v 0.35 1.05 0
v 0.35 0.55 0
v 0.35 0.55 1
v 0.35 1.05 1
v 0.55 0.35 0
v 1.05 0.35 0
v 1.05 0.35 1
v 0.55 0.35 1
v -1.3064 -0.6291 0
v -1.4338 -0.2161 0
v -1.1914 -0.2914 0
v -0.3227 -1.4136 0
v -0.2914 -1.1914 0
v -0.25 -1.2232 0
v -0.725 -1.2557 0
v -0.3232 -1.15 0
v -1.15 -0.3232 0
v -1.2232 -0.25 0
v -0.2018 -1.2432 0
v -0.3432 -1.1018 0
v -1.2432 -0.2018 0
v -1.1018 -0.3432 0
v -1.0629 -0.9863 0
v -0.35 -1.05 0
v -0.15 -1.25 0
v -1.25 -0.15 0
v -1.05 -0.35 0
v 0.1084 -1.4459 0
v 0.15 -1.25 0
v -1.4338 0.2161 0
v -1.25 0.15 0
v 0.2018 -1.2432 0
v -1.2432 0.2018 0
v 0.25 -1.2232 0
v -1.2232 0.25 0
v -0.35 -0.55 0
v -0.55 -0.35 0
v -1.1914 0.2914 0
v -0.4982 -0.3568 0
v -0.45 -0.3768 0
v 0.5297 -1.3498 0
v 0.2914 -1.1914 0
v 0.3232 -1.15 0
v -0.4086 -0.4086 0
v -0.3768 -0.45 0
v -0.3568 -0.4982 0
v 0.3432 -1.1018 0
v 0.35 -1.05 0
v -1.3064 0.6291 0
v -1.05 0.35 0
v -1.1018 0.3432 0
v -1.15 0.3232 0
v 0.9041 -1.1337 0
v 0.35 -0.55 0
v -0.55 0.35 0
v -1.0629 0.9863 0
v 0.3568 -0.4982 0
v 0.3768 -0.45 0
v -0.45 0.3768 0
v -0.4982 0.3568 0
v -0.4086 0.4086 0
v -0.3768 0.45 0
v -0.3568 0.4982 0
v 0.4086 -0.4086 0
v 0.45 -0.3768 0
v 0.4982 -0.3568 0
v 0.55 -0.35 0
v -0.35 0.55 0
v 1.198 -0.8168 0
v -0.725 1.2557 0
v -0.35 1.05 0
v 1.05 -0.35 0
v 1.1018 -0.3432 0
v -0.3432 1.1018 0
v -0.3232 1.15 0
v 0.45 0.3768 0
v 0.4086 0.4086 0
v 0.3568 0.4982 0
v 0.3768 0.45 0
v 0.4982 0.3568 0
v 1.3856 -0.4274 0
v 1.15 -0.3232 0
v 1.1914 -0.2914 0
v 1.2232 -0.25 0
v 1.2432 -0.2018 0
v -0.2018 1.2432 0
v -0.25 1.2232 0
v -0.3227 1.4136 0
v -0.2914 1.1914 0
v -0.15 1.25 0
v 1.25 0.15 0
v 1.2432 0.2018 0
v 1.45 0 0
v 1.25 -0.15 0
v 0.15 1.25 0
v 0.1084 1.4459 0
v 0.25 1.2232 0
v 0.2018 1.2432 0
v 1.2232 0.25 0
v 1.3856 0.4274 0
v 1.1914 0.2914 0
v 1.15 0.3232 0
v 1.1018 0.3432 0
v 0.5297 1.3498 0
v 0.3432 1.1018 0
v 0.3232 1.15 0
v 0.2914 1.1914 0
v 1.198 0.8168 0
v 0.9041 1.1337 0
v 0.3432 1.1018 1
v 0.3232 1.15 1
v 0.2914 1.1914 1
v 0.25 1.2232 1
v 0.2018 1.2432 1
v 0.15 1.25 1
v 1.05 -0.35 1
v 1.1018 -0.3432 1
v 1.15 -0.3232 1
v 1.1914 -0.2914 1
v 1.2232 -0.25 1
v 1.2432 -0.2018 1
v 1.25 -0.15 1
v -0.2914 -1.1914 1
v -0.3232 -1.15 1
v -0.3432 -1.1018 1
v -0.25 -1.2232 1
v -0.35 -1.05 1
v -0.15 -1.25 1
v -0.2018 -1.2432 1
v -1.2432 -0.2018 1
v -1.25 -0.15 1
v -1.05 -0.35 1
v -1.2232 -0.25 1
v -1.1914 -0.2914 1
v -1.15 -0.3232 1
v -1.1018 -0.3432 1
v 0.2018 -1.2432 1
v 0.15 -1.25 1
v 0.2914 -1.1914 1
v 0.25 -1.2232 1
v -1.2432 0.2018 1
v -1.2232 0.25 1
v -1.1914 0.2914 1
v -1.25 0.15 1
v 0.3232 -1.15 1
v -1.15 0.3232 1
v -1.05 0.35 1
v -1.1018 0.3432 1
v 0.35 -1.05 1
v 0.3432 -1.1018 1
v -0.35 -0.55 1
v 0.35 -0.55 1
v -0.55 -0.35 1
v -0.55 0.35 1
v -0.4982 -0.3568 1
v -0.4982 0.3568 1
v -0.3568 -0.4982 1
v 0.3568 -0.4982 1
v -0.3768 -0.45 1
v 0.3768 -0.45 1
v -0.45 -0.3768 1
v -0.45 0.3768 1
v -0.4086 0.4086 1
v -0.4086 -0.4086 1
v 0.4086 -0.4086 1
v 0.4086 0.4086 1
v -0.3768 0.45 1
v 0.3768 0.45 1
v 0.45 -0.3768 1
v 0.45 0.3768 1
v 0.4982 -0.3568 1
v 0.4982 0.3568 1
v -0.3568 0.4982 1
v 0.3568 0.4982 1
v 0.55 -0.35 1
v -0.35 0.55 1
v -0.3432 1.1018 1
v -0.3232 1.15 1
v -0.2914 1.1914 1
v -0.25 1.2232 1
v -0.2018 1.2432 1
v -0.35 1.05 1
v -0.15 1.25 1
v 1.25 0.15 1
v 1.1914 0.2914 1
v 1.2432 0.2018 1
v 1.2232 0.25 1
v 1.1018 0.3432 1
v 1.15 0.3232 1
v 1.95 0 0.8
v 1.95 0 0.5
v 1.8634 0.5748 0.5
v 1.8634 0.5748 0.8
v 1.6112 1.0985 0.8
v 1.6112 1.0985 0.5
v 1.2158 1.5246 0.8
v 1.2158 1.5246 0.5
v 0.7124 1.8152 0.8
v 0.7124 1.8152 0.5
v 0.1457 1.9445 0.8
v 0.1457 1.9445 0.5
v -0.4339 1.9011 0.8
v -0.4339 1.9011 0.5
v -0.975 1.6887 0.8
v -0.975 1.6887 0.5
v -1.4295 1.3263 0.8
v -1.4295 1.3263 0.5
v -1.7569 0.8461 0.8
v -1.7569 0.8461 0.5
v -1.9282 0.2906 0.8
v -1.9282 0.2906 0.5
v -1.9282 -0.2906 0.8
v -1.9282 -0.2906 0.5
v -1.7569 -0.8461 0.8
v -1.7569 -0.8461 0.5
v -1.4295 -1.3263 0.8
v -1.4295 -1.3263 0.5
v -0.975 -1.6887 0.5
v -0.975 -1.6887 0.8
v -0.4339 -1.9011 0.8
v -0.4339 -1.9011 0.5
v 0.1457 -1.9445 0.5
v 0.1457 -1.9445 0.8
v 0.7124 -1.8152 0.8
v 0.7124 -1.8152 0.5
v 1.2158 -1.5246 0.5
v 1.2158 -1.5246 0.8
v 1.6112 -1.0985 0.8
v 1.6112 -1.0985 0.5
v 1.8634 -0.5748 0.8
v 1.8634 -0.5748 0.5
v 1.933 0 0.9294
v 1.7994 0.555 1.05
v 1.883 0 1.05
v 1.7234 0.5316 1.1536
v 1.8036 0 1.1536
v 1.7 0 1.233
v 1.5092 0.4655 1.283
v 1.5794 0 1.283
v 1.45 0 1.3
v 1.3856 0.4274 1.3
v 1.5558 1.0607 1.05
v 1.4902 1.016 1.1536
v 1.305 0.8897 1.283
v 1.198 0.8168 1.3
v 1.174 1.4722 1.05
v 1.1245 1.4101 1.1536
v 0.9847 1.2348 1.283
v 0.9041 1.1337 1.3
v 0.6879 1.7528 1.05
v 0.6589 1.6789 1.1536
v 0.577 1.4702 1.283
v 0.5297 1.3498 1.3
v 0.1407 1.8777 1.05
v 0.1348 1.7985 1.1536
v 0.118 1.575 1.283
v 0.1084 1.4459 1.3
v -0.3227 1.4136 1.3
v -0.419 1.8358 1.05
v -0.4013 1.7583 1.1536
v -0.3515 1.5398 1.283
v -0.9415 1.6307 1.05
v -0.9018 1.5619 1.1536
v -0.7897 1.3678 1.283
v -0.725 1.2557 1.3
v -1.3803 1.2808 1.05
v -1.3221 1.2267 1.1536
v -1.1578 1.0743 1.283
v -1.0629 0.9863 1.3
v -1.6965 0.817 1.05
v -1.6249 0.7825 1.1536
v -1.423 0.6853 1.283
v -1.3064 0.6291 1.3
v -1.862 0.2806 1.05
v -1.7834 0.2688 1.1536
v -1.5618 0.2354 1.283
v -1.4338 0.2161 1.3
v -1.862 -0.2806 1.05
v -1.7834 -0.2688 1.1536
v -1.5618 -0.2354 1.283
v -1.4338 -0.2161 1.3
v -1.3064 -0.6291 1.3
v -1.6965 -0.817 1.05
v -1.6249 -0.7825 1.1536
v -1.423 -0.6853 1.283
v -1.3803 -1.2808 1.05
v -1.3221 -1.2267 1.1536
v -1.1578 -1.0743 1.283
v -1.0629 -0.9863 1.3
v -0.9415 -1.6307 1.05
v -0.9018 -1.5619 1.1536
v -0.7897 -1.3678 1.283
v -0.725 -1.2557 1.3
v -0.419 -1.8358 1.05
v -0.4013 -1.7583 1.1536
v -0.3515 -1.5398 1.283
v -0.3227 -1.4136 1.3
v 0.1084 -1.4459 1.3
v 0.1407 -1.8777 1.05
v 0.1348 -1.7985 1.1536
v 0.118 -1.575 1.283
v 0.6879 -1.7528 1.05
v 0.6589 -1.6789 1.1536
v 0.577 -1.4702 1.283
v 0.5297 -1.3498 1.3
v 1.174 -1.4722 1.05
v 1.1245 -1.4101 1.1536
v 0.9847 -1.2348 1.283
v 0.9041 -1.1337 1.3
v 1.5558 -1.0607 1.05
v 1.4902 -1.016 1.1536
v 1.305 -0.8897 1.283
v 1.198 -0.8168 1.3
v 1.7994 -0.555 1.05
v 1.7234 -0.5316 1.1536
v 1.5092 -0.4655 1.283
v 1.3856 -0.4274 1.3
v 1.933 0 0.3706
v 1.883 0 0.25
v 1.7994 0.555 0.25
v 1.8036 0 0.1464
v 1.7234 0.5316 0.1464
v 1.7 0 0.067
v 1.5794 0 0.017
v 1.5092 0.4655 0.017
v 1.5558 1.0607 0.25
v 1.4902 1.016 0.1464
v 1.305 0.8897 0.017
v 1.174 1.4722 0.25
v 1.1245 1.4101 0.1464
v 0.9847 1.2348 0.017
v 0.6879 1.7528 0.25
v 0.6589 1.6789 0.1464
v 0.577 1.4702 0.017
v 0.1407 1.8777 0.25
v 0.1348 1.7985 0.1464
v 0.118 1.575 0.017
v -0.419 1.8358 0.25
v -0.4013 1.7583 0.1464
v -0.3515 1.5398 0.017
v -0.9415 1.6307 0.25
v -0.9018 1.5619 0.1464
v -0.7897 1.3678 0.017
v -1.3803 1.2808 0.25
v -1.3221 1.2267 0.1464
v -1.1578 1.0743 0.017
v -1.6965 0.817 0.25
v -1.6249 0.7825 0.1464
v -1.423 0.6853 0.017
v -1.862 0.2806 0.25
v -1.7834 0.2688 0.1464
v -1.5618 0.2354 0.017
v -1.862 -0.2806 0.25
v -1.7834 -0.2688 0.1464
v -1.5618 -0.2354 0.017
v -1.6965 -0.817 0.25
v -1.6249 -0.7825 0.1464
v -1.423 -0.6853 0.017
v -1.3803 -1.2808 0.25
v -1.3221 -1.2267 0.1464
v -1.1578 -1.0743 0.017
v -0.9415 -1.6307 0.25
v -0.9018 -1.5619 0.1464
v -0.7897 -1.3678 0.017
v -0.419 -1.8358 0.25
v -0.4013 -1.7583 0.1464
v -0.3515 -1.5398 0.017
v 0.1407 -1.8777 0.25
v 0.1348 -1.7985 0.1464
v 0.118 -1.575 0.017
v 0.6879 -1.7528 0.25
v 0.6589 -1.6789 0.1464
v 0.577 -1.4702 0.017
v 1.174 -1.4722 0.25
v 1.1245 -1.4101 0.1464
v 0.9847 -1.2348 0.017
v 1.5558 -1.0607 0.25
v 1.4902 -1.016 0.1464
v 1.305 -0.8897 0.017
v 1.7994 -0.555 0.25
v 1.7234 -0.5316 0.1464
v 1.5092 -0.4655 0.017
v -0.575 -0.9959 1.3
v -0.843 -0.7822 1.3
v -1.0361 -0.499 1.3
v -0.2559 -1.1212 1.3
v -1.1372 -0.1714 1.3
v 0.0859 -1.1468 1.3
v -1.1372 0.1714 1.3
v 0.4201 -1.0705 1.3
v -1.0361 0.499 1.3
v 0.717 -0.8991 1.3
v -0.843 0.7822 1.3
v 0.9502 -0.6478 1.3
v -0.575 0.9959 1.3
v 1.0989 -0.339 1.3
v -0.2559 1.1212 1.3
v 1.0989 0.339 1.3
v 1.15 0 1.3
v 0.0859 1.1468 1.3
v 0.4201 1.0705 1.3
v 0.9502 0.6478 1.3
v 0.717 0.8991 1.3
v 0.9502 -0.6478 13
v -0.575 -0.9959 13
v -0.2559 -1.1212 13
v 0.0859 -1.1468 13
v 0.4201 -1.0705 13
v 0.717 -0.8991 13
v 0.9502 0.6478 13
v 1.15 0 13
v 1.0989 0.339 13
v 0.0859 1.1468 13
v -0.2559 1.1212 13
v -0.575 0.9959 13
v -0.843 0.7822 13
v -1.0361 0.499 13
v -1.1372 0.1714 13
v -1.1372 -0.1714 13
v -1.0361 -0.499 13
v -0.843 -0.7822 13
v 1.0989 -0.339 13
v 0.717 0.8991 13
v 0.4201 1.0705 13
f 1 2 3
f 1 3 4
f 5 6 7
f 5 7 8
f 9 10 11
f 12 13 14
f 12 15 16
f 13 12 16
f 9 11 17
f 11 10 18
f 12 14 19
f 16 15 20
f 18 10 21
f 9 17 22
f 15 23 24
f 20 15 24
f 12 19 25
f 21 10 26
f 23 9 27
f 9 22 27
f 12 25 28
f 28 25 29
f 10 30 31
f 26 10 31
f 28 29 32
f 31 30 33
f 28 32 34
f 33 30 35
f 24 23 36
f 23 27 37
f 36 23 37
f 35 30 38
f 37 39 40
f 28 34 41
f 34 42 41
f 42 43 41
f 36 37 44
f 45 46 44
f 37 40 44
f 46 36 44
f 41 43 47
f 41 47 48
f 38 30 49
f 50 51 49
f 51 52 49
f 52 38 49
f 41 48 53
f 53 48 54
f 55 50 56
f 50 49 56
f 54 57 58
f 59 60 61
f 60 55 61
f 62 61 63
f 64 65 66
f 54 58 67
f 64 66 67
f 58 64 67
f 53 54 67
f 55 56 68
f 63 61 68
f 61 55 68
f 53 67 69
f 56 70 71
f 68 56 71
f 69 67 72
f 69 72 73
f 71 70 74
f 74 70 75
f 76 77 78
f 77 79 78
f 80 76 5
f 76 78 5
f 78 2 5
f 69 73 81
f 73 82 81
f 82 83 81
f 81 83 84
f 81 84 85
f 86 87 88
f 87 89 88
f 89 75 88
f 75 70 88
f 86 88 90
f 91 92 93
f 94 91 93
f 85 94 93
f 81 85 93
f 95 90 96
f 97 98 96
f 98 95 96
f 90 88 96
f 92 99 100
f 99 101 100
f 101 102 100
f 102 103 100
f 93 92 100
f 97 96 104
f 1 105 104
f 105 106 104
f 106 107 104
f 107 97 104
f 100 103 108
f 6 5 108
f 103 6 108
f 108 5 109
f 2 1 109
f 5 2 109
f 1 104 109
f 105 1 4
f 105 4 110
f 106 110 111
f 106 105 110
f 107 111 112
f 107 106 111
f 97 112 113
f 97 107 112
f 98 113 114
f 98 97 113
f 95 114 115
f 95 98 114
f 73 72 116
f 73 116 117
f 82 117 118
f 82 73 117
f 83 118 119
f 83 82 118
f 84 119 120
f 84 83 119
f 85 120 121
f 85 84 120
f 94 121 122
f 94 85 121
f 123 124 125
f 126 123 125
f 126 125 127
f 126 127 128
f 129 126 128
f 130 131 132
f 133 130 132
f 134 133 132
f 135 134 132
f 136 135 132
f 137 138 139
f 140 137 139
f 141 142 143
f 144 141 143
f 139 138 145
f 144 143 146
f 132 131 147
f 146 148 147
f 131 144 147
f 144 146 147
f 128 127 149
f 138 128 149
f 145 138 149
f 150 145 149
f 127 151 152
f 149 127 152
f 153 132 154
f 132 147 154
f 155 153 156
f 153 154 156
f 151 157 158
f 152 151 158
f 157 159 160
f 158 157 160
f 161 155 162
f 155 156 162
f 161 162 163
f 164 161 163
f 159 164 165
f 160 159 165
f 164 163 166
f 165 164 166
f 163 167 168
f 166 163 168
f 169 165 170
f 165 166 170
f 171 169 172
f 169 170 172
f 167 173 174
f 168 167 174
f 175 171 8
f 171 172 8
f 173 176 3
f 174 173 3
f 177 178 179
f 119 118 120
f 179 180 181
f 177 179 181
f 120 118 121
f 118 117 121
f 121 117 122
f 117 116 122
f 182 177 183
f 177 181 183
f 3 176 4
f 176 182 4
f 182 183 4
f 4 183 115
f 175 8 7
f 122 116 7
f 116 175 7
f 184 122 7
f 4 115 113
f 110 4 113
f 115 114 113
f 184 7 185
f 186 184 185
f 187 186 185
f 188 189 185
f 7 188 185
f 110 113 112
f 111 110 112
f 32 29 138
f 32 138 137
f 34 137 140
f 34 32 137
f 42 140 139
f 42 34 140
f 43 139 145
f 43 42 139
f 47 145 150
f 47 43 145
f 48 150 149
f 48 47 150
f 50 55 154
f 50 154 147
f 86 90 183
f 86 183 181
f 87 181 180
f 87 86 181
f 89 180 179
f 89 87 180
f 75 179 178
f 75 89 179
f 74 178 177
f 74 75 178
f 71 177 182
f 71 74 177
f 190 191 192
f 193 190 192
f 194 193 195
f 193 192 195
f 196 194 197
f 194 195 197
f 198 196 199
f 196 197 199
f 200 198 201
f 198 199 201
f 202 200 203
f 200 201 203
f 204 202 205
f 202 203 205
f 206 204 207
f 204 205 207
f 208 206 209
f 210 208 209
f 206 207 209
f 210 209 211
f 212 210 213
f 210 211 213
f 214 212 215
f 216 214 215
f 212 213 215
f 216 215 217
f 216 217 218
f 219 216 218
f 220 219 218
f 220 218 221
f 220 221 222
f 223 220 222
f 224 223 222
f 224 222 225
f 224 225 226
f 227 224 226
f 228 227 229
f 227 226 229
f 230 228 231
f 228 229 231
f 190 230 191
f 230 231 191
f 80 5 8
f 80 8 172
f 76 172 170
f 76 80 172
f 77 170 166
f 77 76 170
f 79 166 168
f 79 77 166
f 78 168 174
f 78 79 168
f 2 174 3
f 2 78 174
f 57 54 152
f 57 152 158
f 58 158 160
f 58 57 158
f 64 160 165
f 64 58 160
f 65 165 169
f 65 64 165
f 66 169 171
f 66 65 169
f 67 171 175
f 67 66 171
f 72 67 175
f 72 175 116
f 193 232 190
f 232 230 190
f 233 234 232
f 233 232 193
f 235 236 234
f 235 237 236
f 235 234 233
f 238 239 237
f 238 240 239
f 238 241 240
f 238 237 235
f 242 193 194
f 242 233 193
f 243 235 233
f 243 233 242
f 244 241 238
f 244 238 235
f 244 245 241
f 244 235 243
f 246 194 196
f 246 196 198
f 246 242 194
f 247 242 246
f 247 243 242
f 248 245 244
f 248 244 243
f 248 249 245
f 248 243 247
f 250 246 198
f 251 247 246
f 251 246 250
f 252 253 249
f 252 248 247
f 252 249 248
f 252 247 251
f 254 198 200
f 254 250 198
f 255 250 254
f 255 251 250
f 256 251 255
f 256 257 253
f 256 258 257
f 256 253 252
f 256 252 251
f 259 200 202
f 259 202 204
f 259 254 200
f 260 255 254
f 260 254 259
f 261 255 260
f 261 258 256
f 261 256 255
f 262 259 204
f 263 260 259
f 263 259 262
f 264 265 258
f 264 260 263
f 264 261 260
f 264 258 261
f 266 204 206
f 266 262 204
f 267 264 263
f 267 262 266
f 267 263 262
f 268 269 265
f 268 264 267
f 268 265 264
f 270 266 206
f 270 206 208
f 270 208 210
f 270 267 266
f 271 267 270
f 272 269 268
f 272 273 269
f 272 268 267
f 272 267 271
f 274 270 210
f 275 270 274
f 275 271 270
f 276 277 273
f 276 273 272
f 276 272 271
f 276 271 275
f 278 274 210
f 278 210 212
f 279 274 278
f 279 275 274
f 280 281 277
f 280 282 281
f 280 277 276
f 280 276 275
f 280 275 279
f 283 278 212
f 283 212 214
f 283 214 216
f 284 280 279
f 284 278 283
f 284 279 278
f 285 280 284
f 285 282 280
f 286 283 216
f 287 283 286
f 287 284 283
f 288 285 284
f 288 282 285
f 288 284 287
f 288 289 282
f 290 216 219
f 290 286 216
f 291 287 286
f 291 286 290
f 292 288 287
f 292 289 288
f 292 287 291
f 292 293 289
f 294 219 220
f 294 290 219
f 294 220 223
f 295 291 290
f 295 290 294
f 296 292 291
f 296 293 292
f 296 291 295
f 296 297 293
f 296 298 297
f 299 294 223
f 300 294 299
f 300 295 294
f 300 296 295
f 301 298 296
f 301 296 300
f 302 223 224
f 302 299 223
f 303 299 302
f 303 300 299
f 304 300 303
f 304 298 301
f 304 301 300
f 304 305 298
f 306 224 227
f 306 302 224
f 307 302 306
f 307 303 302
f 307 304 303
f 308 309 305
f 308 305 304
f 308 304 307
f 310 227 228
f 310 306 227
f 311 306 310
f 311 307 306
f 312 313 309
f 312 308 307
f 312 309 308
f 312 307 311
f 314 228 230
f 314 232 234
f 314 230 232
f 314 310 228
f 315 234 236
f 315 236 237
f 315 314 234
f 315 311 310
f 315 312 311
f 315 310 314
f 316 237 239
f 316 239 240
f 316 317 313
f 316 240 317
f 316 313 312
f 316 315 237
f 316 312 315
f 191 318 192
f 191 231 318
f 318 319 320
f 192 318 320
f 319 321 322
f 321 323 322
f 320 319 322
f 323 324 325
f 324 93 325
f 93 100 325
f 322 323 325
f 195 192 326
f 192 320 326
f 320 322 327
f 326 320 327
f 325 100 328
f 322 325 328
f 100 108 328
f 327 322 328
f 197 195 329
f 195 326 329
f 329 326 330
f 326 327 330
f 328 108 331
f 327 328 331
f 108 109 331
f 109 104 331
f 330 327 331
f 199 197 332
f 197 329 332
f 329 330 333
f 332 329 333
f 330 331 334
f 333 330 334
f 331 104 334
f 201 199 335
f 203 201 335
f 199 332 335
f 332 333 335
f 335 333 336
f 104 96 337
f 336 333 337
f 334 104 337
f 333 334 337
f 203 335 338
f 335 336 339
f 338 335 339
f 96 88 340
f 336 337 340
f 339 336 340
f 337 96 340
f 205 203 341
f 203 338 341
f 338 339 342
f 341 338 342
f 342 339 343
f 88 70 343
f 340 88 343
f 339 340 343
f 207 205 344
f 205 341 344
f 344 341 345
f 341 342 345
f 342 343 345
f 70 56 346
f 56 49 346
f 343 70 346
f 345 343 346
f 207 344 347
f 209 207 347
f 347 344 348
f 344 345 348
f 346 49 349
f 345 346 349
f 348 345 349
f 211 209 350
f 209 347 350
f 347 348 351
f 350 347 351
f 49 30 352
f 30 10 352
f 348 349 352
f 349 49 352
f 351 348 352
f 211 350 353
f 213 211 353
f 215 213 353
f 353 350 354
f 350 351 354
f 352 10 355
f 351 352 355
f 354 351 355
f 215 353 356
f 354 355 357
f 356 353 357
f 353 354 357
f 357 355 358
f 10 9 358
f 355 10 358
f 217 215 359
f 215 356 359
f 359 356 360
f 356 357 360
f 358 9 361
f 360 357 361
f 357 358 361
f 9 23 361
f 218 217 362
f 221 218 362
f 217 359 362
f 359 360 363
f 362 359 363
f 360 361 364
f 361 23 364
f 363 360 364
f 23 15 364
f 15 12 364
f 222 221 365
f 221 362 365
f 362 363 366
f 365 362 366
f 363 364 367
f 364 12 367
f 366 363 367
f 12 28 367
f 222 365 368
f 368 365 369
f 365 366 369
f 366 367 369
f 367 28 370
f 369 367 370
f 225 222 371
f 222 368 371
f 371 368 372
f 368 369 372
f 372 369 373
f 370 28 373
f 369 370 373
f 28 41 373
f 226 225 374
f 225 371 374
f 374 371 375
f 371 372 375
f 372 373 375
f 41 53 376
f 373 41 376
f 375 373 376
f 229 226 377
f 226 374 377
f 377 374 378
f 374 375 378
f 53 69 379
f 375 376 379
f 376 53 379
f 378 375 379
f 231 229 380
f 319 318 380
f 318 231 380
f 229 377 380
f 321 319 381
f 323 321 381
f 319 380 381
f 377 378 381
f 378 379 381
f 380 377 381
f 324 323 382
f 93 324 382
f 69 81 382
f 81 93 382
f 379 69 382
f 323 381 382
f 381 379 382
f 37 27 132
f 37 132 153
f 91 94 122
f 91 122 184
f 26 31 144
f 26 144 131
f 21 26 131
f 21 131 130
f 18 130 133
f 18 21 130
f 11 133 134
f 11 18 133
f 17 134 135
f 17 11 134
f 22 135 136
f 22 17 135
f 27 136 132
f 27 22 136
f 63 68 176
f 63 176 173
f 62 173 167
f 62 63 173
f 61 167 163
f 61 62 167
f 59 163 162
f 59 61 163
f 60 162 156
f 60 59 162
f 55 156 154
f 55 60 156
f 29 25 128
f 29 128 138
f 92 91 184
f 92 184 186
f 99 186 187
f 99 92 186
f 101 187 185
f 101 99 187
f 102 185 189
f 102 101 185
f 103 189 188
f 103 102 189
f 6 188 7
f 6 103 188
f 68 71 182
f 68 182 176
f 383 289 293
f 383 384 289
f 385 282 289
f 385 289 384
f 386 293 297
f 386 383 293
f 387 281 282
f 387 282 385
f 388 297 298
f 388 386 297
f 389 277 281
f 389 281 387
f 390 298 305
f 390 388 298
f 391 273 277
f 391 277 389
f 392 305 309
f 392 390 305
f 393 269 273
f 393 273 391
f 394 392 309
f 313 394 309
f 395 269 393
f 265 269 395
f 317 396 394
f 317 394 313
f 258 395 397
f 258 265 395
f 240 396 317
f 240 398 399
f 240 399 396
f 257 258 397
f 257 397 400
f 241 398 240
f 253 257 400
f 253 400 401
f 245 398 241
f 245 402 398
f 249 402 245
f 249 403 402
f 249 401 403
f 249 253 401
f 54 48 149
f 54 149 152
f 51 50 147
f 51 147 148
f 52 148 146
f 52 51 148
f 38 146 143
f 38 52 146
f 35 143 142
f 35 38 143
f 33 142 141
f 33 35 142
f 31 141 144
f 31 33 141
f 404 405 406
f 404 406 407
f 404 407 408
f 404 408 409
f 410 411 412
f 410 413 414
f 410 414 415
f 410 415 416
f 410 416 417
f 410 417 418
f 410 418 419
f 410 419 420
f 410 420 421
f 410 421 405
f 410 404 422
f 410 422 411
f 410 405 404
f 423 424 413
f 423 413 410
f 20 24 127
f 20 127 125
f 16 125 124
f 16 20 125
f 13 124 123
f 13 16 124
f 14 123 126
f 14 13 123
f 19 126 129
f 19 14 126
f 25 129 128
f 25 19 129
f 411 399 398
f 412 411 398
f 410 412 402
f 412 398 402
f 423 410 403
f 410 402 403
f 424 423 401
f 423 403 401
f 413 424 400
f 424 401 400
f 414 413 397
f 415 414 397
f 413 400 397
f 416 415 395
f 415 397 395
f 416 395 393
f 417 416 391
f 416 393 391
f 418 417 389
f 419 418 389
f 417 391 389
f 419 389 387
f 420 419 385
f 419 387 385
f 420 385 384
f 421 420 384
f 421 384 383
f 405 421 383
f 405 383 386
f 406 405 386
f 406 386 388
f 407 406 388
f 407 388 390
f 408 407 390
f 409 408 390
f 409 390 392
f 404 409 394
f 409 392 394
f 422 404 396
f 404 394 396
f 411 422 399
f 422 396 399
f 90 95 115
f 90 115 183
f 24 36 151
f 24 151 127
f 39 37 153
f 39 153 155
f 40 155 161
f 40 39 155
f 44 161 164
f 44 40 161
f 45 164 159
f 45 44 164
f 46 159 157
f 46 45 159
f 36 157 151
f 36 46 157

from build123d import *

# Parameters (mm, degrees)
SKETCH1_R           = 1.95
BOSS_EXTRUDE1_DEPTH = 1.3
CUT_EXTRUDE1_DEPTH  = 1
SKETCH3_R           = 1.15
BOSS_EXTRUDE2_DEPTH = 11.7
FILLET1_R           = 0.5


with BuildPart() as part:
    # Sketch1 → Boss-Extrude1 (new body)
    with BuildSketch(Plane.XY):
        Circle(SKETCH1_R)
    extrude(amount=BOSS_EXTRUDE1_DEPTH)

    # Sketch2 → Cut-Extrude1 (cut)
    with BuildSketch(Plane(origin=(0, 0, 0), x_dir=(-1, 0, 0), z_dir=(0, 0, -1))):
        with BuildLine():
            Line((-0.15, 1.25), (0.15, 1.25))
            ThreePointArc((0.15, 1.25), (0.291421356, 1.191421356), (0.35, 1.05))
            Line((0.35, 1.05), (0.35, 0.55))
            ThreePointArc((0.35, 0.55), (0.408578644, 0.408578644), (0.55, 0.35))
            Line((0.55, 0.35), (1.05, 0.35))
            ThreePointArc((1.05, 0.35), (1.191421356, 0.291421356), (1.25, 0.15))
            Line((1.25, 0.15), (1.25, -0.15))
            ThreePointArc((1.25, -0.15), (1.191421356, -0.291421356), (1.05, -0.35))
            Line((1.05, -0.35), (0.55, -0.35))
            ThreePointArc((0.55, -0.35), (0.408578644, -0.408578644), (0.35, -0.55))
            Line((0.35, -0.55), (0.35, -1.05))
            ThreePointArc((0.35, -1.05), (0.291421356, -1.191421356), (0.15, -1.25))
            Line((0.15, -1.25), (-0.15, -1.25))
            ThreePointArc((-0.15, -1.25), (-0.291421356, -1.191421356), (-0.35, -1.05))
            Line((-0.35, -1.05), (-0.35, -0.55))
            ThreePointArc((-0.35, -0.55), (-0.408578644, -0.408578644), (-0.55, -0.35))
            Line((-0.55, -0.35), (-1.05, -0.35))
            ThreePointArc((-1.05, -0.35), (-1.191421356, -0.291421356), (-1.25, -0.15))
            Line((-1.25, -0.15), (-1.25, 0.15))
            ThreePointArc((-1.25, 0.15), (-1.191421356, 0.291421356), (-1.05, 0.35))
            Line((-1.05, 0.35), (-0.55, 0.35))
            ThreePointArc((-0.55, 0.35), (-0.408578644, 0.408578644), (-0.35, 0.55))
            Line((-0.35, 0.55), (-0.35, 1.05))
            ThreePointArc((-0.35, 1.05), (-0.291421356, 1.191421356), (-0.15, 1.25))
        make_face()
    extrude(amount=-CUT_EXTRUDE1_DEPTH, mode=Mode.SUBTRACT)

    # Sketch3 → Boss-Extrude2 (add)
    with BuildSketch(Plane.XY.offset(1.3)):
        Circle(SKETCH3_R)
    extrude(amount=BOSS_EXTRUDE2_DEPTH)

    # Fillet1
    fillet1_edges = [part.edges().sort_by_distance(p)[0] for p in [
        (-1.95, 0, 0),
        (-1.95, 0, 1.3),
    ]]
    fillet(fillet1_edges, radius=FILLET1_R)


solid = part.part
